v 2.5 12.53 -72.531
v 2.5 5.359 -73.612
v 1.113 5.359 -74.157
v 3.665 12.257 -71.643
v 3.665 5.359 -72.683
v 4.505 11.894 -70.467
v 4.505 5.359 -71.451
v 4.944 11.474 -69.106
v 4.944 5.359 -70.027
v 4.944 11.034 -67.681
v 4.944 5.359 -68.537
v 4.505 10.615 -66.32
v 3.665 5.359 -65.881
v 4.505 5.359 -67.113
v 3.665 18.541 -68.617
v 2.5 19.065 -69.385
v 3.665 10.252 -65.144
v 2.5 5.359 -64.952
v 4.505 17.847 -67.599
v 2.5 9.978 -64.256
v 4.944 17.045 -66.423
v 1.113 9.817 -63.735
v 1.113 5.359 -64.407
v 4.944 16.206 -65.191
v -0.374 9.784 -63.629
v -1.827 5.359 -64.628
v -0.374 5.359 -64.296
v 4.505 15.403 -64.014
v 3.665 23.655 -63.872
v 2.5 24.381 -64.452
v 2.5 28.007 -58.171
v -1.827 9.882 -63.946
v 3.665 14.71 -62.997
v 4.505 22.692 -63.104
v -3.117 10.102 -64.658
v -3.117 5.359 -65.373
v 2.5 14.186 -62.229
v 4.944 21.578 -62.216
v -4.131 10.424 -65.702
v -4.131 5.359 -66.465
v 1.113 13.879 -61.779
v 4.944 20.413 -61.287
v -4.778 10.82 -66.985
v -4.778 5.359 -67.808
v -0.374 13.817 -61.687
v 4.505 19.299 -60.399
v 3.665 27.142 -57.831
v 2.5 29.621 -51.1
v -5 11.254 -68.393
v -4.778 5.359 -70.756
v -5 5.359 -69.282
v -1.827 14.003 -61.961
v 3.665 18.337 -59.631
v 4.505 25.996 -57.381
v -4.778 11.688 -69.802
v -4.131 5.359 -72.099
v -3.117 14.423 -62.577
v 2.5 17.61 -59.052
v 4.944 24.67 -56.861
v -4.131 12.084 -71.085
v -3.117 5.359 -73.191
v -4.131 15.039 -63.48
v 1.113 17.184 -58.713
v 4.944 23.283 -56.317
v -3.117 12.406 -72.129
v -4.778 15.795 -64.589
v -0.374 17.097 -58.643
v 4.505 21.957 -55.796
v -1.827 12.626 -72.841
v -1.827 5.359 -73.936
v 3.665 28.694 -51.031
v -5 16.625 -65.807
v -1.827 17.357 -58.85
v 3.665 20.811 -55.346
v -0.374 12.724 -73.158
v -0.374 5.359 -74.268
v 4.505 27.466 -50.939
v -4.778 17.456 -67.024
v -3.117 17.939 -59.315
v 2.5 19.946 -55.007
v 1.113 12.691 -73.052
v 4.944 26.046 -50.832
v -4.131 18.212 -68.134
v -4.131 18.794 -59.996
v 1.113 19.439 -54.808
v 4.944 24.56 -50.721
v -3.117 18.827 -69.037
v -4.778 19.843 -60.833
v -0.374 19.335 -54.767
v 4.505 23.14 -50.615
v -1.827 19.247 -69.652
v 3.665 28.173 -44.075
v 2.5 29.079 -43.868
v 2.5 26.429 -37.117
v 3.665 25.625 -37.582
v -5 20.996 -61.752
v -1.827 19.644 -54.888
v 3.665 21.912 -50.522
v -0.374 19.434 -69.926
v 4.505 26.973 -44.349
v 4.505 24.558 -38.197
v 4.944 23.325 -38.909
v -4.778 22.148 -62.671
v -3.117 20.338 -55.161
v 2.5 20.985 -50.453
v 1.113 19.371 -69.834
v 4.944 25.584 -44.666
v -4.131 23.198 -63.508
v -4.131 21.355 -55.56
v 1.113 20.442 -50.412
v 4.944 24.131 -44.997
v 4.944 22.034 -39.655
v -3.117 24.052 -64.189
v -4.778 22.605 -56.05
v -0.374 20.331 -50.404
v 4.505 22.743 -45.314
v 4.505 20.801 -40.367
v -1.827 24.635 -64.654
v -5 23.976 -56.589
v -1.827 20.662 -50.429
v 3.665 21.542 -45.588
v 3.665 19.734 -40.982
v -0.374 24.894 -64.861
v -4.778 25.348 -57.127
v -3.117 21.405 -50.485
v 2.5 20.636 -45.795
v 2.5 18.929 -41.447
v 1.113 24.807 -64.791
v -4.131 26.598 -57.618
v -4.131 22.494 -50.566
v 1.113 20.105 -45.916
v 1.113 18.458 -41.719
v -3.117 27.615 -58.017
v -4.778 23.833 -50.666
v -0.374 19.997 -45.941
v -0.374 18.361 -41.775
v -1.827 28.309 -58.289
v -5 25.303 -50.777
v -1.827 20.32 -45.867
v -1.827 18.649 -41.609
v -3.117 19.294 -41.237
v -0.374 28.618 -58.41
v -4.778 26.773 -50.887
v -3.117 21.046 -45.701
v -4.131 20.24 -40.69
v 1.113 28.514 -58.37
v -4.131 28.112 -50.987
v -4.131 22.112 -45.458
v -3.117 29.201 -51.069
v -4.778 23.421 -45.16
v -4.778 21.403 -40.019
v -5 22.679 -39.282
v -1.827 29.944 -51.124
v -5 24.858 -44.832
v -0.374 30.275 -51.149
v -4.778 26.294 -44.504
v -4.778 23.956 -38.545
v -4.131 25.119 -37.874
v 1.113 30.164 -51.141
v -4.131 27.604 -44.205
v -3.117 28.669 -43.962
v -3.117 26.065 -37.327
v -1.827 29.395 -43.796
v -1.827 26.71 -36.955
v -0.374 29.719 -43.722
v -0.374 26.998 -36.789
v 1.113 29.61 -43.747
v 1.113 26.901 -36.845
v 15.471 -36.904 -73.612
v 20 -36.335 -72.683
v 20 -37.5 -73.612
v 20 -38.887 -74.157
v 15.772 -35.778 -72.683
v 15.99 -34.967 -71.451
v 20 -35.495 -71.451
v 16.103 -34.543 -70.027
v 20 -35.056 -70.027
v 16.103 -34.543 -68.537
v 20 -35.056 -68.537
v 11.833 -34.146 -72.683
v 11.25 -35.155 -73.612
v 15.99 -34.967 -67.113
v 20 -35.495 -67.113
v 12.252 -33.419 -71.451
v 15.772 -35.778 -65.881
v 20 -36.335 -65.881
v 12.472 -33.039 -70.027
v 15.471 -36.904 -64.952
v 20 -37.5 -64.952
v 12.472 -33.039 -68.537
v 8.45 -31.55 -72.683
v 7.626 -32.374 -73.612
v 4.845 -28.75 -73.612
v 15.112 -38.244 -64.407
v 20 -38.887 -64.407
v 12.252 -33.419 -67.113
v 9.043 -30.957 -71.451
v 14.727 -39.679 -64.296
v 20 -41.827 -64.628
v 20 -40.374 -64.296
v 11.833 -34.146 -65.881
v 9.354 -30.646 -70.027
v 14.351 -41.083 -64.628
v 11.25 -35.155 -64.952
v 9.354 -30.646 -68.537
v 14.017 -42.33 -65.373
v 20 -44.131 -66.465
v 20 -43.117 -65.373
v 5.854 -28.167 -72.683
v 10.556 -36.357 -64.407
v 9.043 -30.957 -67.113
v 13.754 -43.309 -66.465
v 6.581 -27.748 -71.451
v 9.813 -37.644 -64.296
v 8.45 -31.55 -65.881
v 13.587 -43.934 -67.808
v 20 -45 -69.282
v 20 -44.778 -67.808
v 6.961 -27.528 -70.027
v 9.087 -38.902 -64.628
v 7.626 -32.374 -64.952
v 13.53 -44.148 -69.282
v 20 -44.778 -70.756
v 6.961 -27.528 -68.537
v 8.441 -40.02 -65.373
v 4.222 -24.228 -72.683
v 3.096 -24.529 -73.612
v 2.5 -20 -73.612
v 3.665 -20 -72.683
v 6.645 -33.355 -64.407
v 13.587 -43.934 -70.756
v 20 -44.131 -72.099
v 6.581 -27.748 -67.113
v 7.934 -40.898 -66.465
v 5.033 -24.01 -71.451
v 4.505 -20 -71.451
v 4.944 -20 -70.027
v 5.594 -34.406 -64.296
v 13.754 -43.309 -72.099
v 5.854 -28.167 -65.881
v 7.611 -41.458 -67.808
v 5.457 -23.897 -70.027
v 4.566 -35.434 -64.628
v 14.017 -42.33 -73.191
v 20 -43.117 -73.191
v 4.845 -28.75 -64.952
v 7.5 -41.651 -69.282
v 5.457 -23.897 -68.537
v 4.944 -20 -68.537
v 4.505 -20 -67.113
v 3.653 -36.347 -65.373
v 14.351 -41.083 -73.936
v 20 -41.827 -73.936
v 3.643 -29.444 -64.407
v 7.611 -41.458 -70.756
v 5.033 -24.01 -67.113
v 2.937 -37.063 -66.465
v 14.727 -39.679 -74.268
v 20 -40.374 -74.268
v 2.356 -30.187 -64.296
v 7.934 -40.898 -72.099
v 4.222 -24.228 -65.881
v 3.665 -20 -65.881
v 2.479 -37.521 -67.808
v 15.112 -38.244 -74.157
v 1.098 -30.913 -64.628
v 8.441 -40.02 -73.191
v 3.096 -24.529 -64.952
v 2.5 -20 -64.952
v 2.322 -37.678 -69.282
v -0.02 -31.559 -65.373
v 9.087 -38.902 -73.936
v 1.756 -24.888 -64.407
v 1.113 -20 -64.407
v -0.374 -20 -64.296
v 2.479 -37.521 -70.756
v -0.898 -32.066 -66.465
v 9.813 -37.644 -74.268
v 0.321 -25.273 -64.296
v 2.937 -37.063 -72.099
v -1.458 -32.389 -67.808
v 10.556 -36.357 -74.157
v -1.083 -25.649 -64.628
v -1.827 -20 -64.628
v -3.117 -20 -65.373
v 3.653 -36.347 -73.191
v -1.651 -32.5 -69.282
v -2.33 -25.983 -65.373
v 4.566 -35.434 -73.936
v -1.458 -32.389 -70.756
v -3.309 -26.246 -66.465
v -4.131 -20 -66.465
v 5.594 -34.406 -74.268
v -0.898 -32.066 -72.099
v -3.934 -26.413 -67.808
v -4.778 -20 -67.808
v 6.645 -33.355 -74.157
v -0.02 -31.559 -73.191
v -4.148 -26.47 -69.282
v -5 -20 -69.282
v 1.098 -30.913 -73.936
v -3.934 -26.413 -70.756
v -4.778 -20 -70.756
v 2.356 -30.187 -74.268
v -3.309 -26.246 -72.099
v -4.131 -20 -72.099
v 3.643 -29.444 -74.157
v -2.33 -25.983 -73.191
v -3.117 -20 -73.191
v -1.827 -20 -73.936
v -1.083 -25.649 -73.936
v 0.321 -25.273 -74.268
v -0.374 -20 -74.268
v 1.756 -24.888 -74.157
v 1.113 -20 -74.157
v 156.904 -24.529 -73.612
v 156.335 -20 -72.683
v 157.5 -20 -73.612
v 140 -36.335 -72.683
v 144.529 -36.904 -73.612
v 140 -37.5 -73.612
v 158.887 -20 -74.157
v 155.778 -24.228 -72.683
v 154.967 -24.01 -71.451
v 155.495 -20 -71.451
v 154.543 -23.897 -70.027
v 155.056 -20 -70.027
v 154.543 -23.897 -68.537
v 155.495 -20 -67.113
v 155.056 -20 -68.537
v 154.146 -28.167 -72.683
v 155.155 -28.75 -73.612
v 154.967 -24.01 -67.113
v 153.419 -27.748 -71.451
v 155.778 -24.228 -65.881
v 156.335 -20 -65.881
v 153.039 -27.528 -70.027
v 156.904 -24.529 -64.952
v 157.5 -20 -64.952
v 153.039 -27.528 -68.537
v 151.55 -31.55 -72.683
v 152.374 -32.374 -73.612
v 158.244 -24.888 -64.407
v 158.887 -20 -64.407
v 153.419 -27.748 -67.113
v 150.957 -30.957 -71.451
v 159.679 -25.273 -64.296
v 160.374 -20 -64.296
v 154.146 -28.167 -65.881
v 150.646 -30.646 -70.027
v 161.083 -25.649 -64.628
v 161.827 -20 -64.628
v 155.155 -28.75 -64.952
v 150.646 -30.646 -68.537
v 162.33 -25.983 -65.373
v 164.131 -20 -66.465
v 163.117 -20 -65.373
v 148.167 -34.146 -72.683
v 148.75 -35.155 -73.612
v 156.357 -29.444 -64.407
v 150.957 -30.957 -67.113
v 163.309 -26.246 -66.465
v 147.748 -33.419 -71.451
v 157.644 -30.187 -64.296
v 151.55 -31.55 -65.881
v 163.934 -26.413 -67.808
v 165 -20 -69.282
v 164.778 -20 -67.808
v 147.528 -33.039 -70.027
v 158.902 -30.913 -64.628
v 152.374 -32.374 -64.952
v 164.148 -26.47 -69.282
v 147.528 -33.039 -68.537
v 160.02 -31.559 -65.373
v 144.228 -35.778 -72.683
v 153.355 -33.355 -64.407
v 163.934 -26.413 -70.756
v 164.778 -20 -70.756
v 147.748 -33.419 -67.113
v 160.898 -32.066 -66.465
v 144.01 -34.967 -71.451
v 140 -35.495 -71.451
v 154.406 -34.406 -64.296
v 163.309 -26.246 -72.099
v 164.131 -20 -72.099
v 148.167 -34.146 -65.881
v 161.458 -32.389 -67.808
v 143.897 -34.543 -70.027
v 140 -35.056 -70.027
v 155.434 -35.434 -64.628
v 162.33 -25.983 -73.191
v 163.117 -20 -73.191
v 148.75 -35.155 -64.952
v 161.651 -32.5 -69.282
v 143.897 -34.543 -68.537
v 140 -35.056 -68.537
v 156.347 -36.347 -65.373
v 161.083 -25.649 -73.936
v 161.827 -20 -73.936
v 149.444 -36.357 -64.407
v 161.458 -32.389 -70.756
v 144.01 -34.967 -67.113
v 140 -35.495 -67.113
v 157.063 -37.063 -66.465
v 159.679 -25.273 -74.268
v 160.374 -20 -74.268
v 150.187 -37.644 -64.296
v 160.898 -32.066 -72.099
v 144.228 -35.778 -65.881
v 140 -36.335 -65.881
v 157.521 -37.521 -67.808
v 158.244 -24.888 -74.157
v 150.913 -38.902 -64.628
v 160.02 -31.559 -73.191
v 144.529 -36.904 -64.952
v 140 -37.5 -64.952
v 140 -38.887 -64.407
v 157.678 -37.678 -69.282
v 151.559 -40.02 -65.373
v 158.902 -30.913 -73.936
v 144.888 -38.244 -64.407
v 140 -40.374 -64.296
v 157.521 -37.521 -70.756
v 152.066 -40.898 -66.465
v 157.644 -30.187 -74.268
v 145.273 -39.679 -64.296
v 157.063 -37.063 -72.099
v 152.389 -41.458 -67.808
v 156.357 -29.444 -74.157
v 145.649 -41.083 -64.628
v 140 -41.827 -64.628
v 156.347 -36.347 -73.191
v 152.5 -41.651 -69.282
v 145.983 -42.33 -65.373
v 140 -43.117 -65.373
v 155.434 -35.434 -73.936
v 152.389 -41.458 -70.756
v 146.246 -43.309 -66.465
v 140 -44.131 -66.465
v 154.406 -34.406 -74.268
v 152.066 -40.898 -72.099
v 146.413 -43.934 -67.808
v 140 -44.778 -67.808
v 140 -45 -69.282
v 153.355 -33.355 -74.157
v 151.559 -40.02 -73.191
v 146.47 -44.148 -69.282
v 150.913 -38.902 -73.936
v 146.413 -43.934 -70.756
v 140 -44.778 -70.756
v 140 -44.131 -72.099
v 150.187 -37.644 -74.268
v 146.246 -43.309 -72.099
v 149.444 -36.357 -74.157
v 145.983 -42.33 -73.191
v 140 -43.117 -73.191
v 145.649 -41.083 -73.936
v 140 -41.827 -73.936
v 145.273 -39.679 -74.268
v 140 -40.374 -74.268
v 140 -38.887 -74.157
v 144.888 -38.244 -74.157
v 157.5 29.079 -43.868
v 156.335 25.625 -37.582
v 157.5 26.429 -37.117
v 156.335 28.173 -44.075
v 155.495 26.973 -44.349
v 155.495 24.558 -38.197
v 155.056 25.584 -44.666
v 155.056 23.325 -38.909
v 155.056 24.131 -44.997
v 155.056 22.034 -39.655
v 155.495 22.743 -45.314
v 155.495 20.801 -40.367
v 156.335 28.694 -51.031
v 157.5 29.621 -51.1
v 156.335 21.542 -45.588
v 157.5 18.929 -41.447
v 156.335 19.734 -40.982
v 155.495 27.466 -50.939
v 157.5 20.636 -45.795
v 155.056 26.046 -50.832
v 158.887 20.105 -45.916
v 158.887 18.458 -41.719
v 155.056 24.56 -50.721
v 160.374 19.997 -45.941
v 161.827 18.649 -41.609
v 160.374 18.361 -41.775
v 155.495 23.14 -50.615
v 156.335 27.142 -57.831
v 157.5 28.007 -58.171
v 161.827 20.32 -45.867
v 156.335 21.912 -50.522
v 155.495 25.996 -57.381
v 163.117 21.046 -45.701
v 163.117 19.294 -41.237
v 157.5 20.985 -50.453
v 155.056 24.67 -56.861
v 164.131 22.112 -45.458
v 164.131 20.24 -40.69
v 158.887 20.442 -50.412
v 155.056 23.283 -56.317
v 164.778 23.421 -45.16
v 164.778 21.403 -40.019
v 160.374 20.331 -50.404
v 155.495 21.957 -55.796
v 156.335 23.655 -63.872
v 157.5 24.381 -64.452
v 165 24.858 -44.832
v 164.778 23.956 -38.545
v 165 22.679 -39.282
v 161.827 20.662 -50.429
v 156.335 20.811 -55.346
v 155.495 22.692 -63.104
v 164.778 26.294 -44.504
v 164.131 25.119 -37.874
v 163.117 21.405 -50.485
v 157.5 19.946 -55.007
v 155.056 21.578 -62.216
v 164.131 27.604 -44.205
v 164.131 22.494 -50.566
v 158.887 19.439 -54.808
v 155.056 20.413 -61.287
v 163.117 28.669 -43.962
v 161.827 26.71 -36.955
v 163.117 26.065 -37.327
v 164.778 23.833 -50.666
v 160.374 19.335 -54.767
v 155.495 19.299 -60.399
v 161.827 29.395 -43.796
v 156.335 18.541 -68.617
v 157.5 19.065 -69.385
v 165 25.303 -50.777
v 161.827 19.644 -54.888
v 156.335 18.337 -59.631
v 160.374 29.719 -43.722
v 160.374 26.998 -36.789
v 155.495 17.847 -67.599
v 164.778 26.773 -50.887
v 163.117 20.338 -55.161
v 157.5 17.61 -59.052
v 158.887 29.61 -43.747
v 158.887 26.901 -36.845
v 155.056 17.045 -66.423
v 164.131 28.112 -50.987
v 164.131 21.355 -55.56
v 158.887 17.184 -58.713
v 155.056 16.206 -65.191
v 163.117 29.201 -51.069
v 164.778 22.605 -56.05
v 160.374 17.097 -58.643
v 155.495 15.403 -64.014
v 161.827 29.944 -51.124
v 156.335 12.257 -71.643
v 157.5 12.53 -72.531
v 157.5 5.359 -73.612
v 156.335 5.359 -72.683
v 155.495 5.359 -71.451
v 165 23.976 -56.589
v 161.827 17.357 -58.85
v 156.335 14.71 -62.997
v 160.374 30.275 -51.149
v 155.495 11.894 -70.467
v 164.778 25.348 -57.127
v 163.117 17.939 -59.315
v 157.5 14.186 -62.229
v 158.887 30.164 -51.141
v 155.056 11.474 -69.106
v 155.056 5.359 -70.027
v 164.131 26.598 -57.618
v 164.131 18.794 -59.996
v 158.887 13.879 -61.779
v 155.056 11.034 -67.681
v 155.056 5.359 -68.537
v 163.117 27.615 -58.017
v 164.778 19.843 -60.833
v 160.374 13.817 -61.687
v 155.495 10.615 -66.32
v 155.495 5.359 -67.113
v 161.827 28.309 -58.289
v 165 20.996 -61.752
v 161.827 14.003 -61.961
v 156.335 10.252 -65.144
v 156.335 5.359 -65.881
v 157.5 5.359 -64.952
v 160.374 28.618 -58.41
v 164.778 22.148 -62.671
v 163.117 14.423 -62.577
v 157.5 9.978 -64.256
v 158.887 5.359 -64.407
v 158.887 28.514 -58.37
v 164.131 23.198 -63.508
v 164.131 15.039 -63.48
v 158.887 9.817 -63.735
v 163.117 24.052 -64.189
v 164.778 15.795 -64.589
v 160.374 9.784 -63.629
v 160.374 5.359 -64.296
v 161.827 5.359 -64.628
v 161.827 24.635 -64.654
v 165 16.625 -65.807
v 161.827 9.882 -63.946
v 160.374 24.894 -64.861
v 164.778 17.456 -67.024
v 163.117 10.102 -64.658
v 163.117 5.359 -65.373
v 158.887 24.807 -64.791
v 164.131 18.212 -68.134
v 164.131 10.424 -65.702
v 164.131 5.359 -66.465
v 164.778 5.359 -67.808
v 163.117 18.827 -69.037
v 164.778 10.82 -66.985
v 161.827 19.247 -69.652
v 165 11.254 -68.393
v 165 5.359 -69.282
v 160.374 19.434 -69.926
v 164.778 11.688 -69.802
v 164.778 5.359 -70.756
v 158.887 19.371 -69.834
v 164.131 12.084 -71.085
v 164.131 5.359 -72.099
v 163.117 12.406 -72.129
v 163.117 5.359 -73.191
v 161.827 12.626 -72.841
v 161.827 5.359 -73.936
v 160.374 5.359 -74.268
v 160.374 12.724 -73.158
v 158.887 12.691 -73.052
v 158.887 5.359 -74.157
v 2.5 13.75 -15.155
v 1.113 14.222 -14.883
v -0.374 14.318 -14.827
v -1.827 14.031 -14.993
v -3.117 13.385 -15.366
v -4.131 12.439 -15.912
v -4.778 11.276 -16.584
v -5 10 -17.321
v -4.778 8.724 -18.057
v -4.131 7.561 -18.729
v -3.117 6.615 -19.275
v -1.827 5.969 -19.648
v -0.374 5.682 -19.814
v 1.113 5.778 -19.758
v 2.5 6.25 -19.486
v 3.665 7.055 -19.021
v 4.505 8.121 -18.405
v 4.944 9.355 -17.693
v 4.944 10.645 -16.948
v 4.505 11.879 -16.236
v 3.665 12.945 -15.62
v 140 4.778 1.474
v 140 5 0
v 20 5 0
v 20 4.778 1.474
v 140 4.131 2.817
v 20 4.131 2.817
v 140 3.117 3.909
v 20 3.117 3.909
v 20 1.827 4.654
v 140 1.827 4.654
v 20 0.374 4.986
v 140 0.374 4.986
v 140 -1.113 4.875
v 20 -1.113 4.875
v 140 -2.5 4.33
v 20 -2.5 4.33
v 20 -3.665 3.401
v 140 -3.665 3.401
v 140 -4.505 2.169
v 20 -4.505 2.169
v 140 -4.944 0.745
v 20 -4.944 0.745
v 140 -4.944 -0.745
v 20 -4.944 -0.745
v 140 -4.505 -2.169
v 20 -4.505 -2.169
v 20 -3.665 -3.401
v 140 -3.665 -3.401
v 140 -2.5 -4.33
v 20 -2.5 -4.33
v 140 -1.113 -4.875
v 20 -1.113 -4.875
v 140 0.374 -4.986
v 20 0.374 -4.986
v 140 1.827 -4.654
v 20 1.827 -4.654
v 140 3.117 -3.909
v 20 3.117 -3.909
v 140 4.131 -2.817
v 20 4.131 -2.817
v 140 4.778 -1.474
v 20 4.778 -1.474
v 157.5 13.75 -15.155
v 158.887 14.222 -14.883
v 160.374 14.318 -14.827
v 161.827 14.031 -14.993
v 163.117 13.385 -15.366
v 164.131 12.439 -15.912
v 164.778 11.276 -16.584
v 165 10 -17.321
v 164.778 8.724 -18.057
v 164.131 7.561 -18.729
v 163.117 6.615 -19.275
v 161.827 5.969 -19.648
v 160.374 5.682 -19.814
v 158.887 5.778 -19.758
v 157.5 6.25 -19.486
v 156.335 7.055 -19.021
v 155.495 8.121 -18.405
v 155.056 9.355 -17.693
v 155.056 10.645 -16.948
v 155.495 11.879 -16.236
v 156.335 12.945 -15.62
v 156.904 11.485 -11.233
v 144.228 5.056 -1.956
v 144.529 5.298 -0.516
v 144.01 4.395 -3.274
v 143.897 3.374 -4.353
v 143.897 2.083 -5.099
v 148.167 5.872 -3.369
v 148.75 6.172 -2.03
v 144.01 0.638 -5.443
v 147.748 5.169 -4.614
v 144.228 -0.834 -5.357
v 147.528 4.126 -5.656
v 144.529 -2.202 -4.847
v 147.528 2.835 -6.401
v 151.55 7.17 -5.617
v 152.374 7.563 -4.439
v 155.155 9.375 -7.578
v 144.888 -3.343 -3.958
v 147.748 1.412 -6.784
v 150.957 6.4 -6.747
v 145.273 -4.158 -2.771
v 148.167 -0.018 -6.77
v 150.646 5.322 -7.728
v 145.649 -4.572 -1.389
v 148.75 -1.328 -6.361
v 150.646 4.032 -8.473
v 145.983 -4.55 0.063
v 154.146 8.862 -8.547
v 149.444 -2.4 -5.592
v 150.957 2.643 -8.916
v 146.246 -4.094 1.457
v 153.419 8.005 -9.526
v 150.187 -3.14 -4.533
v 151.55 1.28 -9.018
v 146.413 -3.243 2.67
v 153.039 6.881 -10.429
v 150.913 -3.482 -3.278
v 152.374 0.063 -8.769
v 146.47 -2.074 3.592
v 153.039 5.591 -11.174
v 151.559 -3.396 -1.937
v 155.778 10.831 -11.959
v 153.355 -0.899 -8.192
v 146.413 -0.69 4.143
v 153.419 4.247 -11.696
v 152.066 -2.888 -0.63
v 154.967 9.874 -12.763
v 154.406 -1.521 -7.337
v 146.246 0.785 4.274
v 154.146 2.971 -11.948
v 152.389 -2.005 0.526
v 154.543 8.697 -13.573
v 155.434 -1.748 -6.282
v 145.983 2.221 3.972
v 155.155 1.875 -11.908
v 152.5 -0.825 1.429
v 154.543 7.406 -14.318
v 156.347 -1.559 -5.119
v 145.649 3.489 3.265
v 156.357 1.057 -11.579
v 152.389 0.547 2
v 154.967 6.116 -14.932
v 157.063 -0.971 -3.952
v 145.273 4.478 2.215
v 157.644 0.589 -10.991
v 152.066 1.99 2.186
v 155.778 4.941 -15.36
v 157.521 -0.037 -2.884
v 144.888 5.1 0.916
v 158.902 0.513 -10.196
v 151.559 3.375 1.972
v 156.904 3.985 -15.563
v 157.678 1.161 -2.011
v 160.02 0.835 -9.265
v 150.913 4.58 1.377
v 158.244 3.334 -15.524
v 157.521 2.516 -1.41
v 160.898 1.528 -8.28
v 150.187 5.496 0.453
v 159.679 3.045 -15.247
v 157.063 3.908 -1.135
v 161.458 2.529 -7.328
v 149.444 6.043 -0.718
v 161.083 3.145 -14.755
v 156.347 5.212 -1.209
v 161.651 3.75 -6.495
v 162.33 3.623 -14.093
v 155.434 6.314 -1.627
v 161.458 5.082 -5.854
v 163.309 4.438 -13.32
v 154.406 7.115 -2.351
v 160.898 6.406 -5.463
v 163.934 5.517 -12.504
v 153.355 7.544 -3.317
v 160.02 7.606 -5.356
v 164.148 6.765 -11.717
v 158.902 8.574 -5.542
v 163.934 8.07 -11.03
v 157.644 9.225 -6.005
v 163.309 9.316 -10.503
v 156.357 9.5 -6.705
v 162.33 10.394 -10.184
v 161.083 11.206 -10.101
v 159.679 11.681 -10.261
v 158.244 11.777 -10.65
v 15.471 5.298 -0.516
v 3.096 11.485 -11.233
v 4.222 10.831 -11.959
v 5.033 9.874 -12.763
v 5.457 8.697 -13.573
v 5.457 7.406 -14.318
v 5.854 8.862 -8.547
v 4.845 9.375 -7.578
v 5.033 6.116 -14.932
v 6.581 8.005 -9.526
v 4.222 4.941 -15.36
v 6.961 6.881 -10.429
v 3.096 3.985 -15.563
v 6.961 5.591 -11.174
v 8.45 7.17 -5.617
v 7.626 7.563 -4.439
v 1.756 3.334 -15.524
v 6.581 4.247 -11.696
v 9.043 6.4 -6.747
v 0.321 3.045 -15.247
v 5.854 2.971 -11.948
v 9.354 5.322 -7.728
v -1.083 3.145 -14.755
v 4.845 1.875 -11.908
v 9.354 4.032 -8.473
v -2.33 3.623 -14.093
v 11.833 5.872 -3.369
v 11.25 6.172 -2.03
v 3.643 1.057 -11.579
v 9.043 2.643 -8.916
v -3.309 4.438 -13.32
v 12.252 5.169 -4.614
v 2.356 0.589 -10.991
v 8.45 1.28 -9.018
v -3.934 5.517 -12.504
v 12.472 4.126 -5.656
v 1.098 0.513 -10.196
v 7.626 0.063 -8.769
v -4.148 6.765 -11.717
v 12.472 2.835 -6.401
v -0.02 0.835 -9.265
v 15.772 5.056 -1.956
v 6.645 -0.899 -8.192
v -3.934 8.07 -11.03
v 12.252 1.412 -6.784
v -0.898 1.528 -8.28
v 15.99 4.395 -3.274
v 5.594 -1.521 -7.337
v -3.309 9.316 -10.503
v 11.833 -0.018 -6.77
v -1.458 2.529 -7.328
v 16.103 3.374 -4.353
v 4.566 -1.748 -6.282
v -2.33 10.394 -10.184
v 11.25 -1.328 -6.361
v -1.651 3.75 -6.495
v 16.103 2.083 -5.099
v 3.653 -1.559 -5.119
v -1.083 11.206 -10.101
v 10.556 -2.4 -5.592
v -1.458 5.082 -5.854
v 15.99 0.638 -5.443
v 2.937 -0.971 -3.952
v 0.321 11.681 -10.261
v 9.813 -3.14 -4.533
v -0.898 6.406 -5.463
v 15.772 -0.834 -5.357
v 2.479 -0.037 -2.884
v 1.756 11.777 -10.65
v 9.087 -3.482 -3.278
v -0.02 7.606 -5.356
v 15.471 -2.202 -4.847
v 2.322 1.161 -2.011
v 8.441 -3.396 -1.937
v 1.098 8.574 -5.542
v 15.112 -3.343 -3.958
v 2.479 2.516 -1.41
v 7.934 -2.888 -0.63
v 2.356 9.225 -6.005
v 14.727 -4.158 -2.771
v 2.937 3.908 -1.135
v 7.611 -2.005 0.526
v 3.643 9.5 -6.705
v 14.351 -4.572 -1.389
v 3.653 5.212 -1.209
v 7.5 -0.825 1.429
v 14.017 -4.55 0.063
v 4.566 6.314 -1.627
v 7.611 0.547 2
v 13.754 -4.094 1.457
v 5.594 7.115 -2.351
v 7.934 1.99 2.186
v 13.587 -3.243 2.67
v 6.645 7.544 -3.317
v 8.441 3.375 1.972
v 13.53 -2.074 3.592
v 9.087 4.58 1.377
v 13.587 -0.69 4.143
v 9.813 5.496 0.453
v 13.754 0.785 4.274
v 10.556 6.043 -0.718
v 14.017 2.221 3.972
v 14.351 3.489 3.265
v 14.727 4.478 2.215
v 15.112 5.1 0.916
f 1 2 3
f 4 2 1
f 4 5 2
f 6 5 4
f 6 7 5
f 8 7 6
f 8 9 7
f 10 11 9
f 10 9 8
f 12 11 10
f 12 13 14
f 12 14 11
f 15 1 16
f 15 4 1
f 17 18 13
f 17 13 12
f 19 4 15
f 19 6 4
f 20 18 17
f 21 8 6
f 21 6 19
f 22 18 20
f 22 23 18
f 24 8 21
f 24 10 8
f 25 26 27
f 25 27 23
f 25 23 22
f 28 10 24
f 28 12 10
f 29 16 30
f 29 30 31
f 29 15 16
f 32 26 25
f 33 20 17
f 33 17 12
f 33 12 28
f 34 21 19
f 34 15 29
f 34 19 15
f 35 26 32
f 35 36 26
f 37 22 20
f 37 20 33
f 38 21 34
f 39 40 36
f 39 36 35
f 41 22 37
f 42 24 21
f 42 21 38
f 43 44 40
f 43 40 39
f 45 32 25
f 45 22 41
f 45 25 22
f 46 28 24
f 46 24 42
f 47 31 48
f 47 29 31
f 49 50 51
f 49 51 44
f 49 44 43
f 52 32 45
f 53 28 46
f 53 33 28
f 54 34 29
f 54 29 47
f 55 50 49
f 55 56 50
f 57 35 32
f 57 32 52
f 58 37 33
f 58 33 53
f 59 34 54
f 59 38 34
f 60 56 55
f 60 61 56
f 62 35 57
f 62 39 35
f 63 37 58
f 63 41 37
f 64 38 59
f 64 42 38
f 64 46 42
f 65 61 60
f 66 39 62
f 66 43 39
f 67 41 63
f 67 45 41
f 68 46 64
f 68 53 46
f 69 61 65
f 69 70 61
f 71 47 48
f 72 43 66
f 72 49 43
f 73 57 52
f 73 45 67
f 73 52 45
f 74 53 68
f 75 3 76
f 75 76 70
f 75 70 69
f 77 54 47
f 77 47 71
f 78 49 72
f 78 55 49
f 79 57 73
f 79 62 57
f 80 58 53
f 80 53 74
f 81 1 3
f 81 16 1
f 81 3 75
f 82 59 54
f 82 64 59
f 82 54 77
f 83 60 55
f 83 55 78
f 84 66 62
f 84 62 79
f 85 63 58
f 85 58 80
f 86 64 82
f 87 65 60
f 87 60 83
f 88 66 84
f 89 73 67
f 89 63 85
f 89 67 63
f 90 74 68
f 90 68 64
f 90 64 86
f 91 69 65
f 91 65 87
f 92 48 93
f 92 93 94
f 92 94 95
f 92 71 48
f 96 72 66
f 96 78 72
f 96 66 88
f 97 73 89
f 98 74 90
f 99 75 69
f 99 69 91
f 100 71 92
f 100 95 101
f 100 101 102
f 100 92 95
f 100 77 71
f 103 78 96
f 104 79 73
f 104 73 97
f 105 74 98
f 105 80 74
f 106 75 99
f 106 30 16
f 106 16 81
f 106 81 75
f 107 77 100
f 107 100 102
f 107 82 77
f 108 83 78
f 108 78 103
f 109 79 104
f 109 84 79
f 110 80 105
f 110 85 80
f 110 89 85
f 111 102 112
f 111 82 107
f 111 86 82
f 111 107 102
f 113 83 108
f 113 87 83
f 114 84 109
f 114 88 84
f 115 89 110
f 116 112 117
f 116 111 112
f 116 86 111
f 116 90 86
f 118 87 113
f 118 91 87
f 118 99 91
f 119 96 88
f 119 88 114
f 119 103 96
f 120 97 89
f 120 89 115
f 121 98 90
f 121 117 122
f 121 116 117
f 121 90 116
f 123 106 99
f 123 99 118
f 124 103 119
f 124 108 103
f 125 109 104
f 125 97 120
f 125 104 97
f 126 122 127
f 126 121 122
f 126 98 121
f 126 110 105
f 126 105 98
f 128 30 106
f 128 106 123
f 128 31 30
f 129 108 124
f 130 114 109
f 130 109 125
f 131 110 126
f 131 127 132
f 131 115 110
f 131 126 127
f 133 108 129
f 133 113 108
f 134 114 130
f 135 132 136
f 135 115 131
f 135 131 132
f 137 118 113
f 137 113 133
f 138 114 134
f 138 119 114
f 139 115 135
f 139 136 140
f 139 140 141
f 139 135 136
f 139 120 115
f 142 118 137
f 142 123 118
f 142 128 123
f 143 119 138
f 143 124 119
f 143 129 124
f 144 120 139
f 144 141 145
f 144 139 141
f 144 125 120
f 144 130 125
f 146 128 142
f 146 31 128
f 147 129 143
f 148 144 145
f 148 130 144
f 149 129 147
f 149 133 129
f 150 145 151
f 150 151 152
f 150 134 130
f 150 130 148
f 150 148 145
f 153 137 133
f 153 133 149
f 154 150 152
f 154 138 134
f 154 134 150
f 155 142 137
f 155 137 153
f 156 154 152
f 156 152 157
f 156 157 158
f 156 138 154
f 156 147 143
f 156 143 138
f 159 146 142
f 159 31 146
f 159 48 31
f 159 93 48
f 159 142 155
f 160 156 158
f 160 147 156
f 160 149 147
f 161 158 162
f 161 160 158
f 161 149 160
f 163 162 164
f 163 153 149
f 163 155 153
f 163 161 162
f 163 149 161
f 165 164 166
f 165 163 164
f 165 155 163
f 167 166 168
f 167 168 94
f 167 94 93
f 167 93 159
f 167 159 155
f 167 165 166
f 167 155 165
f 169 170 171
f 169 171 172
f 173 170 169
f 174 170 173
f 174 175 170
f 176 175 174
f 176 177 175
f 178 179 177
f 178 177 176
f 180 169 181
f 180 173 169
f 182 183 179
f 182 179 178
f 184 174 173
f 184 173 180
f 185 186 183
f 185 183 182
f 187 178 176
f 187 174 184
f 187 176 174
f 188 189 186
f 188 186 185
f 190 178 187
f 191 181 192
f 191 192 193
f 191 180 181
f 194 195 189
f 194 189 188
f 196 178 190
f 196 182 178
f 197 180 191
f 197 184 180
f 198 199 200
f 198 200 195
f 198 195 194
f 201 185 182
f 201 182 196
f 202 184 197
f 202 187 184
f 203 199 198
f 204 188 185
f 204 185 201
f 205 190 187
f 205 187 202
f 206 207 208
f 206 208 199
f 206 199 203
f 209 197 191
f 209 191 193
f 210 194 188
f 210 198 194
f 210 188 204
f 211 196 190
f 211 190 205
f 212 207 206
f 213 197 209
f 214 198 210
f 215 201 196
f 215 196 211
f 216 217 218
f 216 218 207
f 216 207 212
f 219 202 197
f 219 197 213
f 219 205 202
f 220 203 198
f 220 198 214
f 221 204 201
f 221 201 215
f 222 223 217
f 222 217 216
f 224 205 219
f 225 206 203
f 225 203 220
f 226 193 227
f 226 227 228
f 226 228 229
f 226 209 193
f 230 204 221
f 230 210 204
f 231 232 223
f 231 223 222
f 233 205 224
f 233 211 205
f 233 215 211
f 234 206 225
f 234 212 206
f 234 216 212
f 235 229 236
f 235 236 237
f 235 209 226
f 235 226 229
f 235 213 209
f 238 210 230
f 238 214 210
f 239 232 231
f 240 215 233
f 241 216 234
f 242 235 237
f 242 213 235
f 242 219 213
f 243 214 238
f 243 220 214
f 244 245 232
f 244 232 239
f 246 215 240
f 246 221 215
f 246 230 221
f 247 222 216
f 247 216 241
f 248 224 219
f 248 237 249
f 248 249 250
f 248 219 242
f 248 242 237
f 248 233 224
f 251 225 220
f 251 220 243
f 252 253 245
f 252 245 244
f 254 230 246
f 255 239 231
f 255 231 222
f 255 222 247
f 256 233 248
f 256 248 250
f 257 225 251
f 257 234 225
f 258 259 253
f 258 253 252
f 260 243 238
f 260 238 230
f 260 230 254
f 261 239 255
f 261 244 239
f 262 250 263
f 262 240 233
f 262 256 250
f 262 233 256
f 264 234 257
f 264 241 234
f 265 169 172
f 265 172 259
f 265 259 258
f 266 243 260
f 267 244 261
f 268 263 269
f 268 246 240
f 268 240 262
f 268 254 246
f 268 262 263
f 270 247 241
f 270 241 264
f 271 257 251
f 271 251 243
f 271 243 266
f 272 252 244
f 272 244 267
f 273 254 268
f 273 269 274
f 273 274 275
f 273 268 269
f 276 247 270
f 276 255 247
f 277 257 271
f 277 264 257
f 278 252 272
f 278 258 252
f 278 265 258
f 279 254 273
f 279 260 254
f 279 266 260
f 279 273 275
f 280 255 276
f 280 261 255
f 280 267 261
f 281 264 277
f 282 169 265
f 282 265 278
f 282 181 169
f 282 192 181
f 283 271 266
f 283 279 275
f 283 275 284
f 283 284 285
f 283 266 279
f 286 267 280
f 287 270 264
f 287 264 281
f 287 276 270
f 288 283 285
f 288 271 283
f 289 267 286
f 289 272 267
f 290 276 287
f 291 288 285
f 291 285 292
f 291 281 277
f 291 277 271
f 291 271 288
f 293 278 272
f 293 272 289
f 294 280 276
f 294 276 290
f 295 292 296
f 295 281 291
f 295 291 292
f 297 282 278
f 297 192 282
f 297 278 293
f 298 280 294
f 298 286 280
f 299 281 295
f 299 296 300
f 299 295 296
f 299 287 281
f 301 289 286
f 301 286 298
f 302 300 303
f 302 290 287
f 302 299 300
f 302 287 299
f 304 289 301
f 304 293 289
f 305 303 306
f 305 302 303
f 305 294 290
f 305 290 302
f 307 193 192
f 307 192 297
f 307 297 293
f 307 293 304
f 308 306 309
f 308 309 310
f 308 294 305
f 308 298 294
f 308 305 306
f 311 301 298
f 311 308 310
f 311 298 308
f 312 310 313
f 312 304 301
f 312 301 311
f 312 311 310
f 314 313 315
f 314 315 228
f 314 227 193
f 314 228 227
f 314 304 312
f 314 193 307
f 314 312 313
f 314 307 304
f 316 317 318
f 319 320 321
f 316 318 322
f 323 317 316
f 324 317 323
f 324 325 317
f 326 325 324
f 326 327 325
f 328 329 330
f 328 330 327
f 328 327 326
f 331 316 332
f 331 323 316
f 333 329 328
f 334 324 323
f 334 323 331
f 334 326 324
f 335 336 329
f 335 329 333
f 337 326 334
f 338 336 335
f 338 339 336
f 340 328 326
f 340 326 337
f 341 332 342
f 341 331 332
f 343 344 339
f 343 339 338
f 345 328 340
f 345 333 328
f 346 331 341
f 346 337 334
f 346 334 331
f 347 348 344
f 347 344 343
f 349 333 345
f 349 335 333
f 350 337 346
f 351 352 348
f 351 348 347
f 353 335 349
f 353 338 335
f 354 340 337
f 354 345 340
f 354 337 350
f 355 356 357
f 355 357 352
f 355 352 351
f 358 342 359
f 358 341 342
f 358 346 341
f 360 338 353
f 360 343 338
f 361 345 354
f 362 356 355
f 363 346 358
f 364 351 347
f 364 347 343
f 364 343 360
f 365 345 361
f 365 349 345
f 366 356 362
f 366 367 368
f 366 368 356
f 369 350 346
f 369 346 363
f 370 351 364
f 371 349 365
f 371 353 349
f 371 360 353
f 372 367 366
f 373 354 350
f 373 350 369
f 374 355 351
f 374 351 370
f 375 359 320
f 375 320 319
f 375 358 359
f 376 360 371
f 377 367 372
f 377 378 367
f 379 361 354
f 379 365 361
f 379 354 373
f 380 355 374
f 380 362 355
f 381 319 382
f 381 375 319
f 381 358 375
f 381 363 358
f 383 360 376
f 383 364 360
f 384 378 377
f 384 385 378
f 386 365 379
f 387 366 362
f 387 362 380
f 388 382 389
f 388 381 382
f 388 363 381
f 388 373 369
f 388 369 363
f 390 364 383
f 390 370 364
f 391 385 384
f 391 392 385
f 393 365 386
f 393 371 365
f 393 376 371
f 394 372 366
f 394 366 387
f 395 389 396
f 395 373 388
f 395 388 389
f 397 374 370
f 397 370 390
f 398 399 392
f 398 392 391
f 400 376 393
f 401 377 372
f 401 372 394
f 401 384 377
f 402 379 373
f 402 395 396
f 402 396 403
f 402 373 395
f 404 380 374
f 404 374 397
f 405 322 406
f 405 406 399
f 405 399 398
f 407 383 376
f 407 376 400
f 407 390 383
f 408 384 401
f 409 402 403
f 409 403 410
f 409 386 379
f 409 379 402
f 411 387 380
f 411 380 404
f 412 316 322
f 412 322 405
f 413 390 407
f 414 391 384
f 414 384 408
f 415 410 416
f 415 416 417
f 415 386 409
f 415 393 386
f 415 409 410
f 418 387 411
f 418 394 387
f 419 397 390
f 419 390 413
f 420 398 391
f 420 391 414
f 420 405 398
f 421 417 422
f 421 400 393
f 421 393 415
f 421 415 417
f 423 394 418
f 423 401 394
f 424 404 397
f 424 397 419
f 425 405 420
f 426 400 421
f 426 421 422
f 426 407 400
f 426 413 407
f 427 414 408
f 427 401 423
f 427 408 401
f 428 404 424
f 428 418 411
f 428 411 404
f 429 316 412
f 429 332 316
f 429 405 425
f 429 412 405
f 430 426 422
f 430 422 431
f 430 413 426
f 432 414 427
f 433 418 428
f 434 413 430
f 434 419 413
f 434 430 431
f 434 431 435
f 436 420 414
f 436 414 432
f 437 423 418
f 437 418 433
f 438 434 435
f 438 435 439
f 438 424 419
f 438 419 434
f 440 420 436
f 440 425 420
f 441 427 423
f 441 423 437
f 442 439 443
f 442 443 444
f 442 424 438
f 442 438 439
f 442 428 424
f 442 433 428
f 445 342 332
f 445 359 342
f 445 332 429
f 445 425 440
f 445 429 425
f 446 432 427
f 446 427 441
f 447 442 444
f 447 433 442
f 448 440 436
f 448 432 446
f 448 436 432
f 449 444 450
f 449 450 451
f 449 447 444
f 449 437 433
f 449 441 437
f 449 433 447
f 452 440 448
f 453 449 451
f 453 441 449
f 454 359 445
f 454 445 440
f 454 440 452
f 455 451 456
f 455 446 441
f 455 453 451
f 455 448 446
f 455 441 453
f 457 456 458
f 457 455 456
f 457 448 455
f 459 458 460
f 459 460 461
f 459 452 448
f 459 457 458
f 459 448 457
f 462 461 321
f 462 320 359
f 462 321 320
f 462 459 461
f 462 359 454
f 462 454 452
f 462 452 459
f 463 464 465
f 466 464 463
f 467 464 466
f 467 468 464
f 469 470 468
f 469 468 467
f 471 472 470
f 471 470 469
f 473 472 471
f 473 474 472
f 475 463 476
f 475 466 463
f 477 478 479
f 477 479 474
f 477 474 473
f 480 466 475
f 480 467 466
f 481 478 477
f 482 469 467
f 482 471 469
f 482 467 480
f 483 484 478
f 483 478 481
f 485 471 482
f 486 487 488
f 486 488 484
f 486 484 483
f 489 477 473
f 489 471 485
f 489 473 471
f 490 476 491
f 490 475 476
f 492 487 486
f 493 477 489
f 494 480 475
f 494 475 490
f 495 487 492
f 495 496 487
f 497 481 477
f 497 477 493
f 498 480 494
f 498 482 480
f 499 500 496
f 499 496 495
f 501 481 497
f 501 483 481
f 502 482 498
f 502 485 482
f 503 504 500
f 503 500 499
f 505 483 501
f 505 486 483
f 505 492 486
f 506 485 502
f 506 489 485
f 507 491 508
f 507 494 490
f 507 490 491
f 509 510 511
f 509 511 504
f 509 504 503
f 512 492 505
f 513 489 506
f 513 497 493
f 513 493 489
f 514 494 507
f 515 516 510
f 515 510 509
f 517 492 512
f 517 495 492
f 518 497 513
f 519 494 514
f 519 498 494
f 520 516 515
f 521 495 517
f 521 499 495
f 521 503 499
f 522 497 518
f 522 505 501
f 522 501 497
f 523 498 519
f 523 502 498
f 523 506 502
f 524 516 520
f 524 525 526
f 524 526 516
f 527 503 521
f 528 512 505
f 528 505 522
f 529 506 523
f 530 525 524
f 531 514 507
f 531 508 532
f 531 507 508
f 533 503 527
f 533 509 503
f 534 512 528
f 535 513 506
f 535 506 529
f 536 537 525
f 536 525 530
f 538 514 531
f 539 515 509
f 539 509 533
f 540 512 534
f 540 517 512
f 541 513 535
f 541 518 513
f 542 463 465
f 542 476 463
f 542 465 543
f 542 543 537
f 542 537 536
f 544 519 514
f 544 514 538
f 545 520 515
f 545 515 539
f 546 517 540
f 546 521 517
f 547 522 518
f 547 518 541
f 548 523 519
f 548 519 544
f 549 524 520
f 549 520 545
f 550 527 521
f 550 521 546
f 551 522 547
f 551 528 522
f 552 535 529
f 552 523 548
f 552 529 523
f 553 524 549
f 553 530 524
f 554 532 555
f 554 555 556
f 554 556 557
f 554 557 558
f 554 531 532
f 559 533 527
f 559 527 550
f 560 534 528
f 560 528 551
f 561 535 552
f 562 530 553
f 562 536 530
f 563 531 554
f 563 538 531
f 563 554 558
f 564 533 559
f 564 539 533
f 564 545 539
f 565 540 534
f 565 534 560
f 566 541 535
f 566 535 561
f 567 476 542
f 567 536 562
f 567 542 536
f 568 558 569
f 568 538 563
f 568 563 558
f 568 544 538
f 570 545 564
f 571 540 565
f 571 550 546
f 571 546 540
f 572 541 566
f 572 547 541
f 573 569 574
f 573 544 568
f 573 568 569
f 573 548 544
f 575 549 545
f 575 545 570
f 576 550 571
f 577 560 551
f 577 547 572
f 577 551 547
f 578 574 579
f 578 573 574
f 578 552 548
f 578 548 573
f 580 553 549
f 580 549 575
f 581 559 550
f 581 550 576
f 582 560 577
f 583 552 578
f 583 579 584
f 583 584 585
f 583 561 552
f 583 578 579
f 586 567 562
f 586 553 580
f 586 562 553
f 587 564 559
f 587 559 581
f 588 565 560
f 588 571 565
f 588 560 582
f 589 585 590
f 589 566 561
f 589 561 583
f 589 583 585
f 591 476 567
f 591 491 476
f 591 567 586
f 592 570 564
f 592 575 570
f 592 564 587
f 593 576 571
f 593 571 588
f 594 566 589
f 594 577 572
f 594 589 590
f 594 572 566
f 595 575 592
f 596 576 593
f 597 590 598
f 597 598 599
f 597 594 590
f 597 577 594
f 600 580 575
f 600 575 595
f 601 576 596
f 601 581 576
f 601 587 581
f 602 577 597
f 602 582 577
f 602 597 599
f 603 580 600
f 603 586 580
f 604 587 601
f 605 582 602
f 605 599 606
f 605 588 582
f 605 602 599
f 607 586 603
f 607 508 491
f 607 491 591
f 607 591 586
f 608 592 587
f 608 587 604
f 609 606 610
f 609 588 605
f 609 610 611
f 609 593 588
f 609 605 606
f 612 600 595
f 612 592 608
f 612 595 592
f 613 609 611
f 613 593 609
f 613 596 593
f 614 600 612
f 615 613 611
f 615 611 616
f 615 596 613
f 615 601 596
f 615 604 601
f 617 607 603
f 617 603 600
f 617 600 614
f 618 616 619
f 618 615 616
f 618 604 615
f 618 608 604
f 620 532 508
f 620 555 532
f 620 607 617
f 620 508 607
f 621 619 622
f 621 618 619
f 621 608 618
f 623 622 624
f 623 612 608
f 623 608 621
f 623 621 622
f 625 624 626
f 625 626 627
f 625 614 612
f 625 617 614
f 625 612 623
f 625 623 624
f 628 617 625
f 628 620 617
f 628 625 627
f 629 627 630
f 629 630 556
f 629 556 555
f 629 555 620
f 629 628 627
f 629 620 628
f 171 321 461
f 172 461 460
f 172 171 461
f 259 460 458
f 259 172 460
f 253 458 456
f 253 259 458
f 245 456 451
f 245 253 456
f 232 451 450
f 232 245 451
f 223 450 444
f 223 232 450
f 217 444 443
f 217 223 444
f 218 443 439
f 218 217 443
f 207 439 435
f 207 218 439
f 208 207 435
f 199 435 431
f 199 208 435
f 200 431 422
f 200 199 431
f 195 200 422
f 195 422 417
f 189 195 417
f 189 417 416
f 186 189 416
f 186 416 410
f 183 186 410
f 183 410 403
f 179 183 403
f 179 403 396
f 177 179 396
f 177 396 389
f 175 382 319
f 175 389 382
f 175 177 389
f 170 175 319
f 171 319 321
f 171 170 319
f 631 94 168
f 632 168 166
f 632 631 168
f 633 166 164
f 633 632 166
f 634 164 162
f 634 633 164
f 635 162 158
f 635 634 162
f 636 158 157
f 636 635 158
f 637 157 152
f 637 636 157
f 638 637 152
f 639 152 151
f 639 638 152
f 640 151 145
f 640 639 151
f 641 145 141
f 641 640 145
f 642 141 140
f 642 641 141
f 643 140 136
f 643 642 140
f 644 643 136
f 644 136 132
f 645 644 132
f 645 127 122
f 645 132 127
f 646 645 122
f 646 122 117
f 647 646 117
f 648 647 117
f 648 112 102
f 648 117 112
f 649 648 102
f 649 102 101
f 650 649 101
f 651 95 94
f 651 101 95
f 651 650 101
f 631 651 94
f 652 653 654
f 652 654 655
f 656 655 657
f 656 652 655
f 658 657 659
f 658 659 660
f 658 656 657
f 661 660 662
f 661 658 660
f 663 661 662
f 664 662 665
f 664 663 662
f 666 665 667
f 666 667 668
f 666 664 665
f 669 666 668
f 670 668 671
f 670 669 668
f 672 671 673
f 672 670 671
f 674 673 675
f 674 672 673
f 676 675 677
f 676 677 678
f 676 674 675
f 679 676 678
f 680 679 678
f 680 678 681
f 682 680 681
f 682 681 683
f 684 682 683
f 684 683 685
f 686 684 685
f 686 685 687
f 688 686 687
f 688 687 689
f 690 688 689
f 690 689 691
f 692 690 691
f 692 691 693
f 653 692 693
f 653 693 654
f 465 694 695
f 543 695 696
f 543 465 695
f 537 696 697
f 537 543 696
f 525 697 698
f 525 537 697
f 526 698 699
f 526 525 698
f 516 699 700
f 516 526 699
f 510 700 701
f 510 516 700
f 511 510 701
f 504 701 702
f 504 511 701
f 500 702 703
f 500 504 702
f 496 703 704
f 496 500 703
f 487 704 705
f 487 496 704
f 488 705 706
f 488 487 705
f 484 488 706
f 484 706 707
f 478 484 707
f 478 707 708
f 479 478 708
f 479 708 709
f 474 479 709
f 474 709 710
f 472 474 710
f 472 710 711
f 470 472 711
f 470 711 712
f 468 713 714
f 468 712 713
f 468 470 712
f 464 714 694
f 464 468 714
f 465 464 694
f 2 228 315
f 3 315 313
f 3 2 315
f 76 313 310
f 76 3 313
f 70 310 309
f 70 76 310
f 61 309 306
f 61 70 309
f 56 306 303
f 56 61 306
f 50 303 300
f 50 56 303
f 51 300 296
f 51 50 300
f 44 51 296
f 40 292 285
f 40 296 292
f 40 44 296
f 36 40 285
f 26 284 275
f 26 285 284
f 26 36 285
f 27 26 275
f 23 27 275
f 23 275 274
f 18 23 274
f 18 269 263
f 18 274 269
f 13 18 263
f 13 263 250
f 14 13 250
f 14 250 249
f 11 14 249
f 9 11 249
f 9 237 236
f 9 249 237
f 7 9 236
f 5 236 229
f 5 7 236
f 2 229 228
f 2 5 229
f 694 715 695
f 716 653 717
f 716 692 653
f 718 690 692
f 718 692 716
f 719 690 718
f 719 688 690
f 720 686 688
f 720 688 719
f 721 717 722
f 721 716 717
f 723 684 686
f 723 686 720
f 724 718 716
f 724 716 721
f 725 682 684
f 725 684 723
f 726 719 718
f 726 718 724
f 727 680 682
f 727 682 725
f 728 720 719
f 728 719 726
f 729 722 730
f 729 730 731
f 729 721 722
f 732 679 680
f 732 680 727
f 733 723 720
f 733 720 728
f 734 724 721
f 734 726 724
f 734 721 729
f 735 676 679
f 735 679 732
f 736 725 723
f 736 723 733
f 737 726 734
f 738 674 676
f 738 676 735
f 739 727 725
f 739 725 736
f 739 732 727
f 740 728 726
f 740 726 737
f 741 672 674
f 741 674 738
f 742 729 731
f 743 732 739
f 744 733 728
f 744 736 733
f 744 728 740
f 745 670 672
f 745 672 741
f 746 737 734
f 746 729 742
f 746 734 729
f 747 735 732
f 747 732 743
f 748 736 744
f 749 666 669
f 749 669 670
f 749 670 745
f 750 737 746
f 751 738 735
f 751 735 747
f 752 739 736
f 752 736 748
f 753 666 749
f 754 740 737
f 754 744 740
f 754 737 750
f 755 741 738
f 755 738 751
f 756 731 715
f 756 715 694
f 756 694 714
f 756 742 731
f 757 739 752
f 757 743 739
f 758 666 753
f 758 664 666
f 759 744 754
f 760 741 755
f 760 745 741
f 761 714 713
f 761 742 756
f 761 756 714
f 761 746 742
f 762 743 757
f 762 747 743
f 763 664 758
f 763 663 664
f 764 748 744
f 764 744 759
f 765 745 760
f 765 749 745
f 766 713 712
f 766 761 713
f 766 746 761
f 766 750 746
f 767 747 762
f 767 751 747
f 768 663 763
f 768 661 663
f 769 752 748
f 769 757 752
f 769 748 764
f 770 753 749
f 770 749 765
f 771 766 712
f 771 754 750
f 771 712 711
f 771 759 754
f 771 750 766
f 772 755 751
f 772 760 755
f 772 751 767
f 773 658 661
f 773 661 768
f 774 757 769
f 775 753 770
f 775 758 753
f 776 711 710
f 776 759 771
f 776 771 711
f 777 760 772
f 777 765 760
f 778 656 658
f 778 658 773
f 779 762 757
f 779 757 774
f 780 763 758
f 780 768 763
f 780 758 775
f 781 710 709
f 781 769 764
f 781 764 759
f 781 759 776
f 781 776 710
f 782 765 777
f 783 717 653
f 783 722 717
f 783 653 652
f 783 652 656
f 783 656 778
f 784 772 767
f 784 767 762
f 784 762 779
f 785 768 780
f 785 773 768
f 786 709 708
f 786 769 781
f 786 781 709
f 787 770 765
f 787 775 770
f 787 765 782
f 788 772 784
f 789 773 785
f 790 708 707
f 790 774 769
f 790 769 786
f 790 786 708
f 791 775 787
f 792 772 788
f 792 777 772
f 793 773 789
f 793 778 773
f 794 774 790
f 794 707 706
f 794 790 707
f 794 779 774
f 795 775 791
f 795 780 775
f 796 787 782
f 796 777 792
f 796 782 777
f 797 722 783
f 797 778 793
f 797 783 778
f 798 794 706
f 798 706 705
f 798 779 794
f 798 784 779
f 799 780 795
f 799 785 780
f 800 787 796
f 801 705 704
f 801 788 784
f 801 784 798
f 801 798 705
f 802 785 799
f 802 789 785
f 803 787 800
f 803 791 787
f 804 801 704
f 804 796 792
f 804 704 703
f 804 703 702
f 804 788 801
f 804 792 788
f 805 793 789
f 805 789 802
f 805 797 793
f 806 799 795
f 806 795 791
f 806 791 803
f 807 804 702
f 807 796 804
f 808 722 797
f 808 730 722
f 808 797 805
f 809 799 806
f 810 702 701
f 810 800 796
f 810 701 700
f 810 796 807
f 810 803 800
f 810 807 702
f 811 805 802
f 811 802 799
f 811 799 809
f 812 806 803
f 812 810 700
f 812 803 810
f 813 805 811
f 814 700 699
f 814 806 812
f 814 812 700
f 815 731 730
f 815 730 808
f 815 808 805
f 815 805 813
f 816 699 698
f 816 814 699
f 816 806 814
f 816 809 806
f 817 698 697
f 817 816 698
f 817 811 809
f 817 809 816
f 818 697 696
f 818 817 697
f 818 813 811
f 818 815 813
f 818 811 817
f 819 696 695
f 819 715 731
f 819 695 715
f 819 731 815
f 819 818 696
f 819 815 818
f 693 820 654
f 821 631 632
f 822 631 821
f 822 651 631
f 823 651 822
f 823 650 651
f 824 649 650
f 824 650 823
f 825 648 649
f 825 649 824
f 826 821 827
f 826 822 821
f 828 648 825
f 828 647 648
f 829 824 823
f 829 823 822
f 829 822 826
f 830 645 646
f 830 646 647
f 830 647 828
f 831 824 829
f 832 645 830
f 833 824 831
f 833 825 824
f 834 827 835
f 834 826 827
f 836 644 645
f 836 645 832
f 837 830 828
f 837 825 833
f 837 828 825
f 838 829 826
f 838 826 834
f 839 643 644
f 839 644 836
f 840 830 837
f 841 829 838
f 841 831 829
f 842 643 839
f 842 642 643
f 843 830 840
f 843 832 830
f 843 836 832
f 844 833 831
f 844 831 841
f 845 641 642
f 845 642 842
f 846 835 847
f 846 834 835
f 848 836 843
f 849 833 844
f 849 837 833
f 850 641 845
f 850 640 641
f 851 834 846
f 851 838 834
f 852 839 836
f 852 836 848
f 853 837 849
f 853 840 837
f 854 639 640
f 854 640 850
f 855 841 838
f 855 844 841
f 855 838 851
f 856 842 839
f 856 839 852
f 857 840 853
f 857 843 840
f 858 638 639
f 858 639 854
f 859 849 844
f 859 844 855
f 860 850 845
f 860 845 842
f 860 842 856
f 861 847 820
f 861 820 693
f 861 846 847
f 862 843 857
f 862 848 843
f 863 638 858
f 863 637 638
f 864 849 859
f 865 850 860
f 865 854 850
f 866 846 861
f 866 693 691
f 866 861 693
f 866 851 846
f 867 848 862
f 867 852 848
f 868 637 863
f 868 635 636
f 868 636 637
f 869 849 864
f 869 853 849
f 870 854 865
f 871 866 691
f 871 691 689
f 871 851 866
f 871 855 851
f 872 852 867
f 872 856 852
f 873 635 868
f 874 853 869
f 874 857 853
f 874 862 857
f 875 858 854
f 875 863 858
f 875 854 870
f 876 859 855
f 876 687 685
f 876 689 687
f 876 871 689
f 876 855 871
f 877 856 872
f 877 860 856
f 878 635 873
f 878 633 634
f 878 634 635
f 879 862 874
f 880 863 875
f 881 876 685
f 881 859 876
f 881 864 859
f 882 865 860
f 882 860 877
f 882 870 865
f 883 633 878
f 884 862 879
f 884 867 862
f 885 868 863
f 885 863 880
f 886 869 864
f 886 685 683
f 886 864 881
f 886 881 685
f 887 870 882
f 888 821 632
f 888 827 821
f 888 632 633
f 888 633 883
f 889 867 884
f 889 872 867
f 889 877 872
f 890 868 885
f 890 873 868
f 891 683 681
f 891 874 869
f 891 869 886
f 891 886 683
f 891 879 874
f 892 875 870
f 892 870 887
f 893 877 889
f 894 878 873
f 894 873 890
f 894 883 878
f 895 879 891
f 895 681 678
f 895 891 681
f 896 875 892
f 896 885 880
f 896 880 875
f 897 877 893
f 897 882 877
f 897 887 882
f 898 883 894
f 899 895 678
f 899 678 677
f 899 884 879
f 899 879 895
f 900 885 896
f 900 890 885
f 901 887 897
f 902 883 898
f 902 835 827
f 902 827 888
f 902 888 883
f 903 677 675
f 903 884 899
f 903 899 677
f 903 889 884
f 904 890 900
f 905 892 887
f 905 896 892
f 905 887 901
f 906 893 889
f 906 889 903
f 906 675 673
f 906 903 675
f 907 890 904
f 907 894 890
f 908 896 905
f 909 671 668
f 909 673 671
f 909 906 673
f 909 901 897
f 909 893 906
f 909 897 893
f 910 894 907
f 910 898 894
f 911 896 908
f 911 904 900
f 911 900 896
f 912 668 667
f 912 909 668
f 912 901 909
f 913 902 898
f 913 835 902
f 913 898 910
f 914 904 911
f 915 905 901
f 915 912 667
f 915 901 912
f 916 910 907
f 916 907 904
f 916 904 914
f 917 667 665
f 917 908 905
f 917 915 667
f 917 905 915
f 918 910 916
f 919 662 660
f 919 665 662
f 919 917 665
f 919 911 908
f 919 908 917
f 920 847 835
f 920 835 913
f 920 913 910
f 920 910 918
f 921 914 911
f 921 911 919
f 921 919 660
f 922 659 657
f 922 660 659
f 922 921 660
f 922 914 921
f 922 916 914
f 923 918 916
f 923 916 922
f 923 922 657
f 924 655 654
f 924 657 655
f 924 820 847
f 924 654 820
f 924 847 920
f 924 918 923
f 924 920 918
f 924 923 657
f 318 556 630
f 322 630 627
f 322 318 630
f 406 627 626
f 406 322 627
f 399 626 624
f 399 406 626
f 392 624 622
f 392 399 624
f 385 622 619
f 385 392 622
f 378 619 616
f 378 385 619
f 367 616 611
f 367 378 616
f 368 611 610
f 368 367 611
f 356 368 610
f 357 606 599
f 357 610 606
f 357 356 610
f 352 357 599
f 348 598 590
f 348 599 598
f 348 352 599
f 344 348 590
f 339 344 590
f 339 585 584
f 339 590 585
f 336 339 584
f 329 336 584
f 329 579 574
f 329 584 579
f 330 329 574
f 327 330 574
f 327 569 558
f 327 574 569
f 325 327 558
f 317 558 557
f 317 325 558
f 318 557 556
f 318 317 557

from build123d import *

# Parameters (mm, degrees)
SWEEP_3_PROFILE_R = 5


with BuildPart() as part:
    # 扫描3: sweep along a curve in space
    with BuildLine() as sweep_3_path:
        Line((20, 0, 0), (140, 0, 0))
        ThreePointArc((140, 0, 0), (154.142135624, 2.928932188, -5.073059362), (160, 10, -17.320508076))
        Line((160, 10, -17.320508076), (160, 22.679491924, -39.282032303))
        ThreePointArc((160, 22.679491924, -39.282032303), (160, 22.679491924, -59.282032303), (160, 5.358983849, -69.282032303))
        Line((160, 5.358983849, -69.282032303), (160, -20, -69.282032303))
        ThreePointArc((160, -20, -69.282032303), (154.142135624, -34.142135624, -69.282032303), (140, -40, -69.282032303))
        Line((140, -40, -69.282032303), (20, -40, -69.282032303))
        ThreePointArc((20, -40, -69.282032303), (5.857864376, -34.142135624, -69.282032303), (0, -20, -69.282032303))
        Line((0, -20, -69.282032303), (0, 5.358983849, -69.282032303))
        ThreePointArc((0, 5.358983849, -69.282032303), (0, 22.679491924, -59.282032303), (0, 22.679491924, -39.282032303))
        Line((0, 22.679491924, -39.282032303), (0, 10, -17.320508076))
        ThreePointArc((20, 0, 0), (5.857864376, 2.928932188, -5.073059362), (0, 10, -17.320508076))
    # 扫描3 profile (on start of the path) → 扫描3 (sweep)
    with BuildSketch(Plane.YZ.offset(20)):
        Circle(SWEEP_3_PROFILE_R)
    sweep(path=sweep_3_path.line)


solid = part.part
